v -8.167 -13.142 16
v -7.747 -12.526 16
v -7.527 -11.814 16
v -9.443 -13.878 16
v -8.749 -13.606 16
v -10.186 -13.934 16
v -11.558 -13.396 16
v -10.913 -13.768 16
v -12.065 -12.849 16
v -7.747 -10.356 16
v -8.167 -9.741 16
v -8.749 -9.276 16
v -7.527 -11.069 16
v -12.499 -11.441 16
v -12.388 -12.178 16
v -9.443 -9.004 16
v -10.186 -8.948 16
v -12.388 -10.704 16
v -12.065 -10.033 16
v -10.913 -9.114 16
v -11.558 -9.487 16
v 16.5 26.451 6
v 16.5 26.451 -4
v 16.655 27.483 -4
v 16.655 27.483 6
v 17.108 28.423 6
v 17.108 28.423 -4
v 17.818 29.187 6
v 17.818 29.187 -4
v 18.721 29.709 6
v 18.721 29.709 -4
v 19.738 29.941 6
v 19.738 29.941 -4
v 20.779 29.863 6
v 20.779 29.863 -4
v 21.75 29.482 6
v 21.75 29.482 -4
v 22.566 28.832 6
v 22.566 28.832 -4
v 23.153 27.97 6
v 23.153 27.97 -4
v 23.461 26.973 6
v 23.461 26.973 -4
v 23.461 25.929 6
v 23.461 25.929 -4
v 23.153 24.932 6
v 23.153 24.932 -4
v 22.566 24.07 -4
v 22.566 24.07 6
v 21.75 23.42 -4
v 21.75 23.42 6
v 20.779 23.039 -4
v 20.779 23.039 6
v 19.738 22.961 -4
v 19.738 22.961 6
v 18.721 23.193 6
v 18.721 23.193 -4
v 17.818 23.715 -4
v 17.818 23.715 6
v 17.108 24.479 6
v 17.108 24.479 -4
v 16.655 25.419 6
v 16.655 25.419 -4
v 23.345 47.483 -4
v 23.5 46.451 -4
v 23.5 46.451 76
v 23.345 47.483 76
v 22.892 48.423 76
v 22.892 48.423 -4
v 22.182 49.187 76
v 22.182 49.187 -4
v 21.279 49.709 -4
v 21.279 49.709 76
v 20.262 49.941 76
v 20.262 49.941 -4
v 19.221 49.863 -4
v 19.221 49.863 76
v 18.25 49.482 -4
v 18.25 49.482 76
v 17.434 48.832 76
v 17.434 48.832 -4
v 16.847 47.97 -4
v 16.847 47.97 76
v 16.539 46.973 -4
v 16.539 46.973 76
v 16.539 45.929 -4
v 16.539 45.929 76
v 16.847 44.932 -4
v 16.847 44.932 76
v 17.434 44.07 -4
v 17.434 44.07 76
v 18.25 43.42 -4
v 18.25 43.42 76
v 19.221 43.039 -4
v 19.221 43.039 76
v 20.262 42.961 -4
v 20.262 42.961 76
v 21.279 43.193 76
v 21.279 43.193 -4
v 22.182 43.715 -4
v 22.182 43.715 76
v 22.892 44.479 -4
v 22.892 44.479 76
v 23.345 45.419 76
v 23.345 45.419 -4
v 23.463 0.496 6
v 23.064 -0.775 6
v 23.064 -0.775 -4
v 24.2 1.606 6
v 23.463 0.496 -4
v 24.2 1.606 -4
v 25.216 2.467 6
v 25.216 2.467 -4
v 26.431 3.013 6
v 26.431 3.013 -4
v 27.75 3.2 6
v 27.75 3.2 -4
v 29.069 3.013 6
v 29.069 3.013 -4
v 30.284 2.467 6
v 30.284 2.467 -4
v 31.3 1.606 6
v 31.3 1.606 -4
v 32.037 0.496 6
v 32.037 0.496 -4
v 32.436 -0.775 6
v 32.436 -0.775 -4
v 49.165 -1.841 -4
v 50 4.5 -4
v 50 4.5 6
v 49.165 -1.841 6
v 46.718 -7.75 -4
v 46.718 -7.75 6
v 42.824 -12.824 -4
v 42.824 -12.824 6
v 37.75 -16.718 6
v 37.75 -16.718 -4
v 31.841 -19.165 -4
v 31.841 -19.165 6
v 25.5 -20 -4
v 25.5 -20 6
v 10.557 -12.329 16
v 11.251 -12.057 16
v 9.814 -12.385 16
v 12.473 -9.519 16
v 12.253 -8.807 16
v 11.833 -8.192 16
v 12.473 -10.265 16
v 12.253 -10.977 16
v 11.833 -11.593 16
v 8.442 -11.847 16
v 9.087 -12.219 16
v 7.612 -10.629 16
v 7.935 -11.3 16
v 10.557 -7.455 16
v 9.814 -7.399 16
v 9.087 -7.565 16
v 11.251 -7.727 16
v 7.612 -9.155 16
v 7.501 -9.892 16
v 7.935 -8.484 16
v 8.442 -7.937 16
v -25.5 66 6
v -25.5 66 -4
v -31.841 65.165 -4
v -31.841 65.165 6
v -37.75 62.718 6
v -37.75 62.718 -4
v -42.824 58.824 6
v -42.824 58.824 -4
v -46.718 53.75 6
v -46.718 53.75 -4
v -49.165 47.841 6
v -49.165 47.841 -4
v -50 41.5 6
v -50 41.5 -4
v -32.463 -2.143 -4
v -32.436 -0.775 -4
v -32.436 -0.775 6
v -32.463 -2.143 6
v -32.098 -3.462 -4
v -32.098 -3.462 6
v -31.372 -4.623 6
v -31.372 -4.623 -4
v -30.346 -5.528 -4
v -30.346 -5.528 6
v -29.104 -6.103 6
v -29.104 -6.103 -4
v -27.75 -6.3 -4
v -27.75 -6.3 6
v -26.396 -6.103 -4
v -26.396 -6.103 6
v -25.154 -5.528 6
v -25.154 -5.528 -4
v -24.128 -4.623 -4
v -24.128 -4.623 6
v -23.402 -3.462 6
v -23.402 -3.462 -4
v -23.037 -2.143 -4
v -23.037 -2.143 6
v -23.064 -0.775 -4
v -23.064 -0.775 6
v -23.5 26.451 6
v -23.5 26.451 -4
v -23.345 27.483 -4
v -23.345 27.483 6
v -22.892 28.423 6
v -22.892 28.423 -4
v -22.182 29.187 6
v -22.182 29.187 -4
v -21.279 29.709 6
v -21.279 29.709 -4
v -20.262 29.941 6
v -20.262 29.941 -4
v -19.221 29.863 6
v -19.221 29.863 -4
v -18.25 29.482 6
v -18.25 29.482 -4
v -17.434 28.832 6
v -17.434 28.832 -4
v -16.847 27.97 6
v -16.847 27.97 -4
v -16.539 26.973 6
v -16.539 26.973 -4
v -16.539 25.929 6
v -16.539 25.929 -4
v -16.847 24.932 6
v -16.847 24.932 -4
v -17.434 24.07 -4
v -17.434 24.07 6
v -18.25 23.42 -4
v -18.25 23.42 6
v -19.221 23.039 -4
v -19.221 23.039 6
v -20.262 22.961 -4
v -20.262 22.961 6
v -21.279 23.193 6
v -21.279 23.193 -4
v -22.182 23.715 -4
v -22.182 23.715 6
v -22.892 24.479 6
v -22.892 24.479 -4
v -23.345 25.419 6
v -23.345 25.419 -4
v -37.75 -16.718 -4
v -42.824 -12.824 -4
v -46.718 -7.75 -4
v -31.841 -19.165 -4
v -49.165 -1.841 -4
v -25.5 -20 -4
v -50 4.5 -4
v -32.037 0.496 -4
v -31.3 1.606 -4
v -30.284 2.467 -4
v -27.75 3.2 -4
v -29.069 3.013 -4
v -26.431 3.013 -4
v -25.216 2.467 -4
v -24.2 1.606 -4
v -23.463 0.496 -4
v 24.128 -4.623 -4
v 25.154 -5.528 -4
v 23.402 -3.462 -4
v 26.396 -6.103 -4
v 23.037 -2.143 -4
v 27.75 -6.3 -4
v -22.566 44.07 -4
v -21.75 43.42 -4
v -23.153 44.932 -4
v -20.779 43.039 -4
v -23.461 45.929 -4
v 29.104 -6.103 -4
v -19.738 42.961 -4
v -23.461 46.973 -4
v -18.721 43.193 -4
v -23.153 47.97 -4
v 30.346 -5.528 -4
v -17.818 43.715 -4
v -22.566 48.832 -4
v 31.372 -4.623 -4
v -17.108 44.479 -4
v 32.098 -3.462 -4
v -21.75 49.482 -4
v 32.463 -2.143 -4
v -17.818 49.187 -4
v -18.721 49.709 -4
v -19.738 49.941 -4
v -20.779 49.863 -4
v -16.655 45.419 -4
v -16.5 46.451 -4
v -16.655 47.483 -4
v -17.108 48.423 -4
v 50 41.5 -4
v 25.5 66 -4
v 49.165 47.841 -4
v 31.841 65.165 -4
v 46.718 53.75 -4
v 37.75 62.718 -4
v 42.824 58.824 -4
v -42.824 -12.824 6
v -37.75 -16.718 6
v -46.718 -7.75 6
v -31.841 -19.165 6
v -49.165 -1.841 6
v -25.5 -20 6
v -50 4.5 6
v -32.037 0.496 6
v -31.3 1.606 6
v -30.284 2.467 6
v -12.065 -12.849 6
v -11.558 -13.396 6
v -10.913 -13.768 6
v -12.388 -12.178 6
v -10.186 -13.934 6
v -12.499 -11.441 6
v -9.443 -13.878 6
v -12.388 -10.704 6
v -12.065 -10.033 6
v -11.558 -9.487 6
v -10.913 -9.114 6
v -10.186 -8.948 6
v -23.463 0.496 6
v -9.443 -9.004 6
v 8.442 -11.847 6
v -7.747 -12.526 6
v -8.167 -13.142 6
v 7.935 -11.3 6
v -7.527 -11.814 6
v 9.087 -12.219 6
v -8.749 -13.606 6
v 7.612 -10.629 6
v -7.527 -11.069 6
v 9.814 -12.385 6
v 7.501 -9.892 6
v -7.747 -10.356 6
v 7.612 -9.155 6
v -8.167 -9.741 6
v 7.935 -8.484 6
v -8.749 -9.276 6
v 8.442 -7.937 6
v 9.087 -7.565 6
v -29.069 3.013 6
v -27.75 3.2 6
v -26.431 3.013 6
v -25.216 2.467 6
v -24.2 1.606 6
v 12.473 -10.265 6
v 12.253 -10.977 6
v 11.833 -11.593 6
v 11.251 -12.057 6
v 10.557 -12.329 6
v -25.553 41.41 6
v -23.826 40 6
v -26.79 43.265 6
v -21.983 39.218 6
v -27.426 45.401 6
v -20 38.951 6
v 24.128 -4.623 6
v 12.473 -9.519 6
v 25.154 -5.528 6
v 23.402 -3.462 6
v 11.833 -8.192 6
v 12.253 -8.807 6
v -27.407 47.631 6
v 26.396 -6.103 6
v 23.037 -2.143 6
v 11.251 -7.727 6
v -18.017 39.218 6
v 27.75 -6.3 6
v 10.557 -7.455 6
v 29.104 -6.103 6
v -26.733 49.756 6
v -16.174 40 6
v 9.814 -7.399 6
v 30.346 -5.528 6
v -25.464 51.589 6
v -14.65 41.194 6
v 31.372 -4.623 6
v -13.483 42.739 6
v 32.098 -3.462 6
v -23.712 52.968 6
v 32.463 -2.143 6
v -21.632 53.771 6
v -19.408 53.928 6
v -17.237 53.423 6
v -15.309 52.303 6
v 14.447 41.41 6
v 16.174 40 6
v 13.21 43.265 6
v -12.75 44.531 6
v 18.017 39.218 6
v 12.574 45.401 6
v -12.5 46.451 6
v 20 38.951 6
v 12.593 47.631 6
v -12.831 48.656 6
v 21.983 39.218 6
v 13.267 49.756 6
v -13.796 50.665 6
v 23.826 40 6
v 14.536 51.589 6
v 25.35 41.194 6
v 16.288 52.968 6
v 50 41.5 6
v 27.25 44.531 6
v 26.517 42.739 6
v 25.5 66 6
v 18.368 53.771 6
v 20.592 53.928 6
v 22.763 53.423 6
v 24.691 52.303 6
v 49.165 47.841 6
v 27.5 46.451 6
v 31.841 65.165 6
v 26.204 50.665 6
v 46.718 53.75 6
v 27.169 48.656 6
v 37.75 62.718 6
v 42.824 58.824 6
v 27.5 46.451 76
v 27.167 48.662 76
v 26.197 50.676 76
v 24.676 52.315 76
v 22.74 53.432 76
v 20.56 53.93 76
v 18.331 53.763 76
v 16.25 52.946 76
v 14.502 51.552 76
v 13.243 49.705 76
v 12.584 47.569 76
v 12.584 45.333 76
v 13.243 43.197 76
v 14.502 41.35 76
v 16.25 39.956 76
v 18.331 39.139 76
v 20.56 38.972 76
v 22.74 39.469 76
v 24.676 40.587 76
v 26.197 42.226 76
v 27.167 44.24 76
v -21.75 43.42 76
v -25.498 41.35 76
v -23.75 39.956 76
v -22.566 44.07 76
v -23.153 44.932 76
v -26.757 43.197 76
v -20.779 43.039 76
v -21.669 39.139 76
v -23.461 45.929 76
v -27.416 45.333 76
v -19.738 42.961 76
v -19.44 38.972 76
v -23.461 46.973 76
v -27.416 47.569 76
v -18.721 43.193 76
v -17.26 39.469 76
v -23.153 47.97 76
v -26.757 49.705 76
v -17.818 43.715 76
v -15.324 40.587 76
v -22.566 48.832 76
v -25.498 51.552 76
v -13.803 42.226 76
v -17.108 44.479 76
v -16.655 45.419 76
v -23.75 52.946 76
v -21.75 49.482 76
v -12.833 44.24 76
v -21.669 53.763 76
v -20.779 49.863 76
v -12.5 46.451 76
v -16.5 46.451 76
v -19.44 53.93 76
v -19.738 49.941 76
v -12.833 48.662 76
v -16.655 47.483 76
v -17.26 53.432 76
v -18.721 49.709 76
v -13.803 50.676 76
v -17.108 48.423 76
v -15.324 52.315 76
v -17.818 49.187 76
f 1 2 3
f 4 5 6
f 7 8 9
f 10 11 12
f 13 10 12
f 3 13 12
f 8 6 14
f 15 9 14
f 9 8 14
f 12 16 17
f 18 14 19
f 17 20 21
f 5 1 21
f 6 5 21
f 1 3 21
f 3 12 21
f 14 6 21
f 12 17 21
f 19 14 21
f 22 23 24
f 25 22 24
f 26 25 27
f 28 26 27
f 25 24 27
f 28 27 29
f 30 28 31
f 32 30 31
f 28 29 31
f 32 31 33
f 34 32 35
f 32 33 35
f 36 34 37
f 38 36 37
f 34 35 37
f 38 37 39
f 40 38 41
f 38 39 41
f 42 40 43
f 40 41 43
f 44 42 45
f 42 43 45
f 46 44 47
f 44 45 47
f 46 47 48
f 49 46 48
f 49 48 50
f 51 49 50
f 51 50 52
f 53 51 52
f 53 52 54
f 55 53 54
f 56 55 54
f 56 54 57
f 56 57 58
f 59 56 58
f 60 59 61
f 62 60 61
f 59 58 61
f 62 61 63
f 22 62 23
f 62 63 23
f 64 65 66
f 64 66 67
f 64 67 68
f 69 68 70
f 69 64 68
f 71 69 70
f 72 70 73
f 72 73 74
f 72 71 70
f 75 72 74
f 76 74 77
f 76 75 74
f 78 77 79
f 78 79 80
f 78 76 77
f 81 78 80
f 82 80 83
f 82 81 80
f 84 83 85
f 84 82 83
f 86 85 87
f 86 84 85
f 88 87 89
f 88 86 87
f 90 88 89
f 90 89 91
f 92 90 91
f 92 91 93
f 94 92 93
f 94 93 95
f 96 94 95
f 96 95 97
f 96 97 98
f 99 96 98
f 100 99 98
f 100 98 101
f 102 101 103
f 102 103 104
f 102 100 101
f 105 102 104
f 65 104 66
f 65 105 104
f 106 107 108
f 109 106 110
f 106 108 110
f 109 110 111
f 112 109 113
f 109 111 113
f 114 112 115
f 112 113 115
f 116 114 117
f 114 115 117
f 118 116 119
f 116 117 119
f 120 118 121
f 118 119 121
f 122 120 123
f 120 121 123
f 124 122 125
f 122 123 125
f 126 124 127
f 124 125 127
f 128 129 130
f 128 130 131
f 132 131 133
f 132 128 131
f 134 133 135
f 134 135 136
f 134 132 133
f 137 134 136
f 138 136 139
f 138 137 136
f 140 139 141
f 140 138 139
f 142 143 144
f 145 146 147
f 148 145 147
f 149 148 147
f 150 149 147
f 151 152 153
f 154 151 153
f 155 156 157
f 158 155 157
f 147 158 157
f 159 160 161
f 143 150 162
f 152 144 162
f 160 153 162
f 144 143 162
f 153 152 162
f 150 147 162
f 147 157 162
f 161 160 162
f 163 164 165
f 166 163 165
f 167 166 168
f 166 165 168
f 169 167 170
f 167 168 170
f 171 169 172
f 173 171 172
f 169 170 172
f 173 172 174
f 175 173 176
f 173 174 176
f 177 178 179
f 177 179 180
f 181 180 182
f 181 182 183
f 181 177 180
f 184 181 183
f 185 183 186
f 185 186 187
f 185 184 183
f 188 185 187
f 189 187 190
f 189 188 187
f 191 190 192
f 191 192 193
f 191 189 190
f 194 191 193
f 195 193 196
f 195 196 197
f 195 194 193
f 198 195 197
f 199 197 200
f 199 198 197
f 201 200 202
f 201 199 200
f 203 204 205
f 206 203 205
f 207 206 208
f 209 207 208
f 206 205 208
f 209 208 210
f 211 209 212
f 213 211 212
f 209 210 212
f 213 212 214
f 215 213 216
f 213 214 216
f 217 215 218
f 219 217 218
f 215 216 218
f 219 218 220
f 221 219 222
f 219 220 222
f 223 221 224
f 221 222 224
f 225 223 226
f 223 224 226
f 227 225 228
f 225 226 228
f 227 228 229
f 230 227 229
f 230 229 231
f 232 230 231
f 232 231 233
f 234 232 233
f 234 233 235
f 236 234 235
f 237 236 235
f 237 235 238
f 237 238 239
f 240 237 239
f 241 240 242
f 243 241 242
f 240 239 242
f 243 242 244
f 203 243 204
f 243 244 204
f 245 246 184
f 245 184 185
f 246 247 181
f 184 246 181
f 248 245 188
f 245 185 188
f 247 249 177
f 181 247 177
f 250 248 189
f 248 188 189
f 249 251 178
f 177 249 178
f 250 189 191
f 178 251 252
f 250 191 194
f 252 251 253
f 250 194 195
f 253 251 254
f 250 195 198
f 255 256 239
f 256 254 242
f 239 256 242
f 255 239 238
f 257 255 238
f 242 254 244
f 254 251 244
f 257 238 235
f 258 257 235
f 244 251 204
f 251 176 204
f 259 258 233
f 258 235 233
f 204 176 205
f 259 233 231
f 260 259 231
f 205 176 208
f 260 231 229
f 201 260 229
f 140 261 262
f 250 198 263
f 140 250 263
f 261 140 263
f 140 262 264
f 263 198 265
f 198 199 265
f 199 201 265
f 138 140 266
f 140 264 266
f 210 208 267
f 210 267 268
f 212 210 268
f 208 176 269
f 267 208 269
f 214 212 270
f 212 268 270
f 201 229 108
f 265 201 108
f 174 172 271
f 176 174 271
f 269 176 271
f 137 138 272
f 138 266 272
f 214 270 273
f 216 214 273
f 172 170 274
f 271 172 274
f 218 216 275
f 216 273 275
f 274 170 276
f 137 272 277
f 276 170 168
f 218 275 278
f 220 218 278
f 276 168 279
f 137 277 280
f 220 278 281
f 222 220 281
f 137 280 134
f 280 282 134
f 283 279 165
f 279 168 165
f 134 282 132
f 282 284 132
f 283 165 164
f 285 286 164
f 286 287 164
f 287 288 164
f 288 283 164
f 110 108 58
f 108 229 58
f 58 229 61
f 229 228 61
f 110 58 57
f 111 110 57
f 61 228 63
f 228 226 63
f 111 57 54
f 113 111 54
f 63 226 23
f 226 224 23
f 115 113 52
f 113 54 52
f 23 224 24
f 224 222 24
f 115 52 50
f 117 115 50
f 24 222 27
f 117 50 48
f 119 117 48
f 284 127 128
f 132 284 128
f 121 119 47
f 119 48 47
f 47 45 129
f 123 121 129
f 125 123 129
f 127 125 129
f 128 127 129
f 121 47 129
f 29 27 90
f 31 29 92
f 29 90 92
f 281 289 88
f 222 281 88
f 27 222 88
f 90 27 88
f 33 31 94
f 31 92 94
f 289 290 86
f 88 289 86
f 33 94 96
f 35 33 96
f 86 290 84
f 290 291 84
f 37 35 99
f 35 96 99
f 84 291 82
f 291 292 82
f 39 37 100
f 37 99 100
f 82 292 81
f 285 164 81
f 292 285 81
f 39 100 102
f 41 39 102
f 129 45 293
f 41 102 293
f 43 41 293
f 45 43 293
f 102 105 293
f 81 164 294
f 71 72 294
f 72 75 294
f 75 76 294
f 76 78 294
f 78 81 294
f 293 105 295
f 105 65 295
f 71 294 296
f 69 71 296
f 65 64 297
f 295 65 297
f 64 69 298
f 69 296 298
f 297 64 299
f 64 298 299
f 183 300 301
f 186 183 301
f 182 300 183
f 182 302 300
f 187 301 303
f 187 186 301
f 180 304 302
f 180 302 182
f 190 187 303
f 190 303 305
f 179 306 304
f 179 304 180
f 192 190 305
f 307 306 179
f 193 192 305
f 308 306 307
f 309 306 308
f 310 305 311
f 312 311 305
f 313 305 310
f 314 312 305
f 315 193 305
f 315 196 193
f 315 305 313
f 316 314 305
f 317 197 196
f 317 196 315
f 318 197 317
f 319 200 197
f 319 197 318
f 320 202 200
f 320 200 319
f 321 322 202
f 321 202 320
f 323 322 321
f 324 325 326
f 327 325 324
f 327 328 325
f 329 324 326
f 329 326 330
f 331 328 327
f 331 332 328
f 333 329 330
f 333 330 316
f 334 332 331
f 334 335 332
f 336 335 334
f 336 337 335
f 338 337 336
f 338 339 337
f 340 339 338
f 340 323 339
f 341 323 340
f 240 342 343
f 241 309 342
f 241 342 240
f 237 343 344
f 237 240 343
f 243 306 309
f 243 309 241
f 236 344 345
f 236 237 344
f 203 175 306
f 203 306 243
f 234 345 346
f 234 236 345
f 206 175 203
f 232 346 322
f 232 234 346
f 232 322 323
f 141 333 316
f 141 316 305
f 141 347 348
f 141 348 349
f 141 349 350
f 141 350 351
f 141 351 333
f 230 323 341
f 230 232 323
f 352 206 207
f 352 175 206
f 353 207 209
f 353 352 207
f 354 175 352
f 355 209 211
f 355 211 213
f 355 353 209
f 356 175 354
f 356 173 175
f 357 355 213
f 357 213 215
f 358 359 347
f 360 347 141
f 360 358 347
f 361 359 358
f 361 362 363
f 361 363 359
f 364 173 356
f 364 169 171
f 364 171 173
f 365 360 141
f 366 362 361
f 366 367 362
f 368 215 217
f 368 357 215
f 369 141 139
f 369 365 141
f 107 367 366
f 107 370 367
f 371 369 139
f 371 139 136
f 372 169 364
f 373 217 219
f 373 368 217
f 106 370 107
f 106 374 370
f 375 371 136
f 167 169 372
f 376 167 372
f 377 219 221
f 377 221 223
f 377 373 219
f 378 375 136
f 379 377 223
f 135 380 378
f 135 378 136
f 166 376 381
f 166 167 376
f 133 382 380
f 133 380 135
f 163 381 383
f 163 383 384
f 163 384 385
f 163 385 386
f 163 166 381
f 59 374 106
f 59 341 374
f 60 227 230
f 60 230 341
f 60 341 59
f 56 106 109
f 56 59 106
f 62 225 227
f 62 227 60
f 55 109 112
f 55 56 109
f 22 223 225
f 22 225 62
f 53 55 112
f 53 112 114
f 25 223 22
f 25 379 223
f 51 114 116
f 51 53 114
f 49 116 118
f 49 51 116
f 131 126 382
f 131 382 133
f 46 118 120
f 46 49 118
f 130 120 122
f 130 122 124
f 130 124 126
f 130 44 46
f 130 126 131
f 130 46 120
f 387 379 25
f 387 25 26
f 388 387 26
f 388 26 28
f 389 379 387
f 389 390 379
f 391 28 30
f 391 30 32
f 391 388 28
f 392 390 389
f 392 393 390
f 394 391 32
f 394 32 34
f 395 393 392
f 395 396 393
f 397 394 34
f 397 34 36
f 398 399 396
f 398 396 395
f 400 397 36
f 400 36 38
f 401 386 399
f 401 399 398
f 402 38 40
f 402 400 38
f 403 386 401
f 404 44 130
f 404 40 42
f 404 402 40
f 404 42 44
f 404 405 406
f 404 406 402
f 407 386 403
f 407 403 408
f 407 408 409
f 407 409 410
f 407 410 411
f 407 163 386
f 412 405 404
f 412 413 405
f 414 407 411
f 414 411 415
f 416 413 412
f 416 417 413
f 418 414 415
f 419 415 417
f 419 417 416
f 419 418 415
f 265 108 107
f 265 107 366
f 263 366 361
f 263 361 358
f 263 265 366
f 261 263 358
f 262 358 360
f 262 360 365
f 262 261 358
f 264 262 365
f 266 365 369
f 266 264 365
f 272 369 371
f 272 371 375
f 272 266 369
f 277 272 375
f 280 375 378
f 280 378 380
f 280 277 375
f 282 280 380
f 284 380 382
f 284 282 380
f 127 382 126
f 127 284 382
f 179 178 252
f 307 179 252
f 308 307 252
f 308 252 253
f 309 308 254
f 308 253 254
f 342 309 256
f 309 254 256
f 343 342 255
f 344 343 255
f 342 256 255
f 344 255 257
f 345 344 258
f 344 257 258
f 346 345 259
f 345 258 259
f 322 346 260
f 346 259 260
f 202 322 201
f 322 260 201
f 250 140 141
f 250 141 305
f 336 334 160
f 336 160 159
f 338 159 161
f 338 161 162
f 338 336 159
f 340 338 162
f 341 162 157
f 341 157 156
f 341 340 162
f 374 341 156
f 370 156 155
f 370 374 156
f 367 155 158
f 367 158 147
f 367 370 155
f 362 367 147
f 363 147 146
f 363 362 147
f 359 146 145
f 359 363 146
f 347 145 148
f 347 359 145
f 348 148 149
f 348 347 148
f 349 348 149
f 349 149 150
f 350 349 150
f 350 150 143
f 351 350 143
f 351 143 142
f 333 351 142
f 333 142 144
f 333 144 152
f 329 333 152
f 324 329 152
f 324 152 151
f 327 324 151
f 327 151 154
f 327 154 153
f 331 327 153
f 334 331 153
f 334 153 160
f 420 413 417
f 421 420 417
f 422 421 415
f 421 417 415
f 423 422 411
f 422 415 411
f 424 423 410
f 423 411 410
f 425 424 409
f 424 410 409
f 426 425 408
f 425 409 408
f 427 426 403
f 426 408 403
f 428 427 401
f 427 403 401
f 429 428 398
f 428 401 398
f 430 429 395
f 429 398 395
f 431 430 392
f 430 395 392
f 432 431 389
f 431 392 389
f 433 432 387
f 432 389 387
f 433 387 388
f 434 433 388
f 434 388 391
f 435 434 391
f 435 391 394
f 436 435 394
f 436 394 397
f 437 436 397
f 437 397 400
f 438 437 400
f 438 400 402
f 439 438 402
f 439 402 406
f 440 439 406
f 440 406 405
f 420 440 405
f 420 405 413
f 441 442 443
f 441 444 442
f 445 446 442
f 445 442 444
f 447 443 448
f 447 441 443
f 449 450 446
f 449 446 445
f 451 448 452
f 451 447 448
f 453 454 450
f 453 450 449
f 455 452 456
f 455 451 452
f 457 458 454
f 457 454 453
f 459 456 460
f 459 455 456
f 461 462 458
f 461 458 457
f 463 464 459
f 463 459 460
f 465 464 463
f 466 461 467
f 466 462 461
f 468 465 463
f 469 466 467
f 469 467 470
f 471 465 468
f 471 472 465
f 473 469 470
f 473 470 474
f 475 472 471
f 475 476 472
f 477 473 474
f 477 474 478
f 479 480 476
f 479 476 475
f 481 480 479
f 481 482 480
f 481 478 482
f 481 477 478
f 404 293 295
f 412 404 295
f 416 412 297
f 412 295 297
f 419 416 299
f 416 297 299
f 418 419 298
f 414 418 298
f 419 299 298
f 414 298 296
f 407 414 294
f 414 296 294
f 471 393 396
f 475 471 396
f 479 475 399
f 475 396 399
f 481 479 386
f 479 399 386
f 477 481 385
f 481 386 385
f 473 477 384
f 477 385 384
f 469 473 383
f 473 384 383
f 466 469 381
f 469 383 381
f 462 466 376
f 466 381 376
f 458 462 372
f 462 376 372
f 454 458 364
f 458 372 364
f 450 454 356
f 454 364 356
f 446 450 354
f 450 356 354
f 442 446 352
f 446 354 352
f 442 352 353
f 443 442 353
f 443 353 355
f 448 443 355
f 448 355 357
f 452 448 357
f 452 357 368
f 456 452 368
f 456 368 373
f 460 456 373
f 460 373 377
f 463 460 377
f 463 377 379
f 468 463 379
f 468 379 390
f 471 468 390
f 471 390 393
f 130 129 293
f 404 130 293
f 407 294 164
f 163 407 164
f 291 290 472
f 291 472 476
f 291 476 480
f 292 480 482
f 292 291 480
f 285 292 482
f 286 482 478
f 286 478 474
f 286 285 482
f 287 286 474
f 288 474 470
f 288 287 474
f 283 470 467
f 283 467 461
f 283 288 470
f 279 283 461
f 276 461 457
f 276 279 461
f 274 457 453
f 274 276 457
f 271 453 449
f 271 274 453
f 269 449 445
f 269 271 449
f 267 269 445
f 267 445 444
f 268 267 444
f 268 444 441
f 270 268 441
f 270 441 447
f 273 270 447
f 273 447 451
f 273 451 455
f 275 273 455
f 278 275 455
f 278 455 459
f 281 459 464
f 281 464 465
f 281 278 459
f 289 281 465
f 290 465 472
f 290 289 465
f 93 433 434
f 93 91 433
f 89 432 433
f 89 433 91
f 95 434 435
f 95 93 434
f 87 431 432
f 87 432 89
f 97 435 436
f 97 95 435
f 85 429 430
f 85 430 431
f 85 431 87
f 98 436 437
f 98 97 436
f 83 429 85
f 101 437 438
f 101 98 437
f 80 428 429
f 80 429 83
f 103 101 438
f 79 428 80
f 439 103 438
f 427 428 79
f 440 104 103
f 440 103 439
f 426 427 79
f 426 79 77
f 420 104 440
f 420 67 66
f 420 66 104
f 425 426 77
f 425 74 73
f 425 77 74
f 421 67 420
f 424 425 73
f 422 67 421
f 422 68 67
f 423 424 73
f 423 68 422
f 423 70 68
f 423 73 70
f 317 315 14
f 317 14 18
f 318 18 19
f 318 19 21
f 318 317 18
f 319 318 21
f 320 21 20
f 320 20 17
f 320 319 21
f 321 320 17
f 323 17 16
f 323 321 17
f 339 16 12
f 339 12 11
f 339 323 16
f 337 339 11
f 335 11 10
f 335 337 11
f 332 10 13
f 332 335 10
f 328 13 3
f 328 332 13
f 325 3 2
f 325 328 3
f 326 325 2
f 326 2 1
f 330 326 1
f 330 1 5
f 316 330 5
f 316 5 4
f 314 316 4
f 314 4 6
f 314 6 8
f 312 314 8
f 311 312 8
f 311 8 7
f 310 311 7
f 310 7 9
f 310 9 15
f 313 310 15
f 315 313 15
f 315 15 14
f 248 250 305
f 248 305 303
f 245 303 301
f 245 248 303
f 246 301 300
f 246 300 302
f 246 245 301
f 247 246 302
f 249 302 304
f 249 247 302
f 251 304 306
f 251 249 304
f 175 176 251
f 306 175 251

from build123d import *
from build123d.topology import SkipClean

# Parameters (mm, degrees)
BOSS_EXTRUDE1_DEPTH      = 6
BOSS_EXTRUDE1_DEPTH_BACK = 4
SKETCH1_W                = 100
SKETCH1_H                = 50
SKETCH2_R                = 4.75
CUT_EXTRUDE1_DEPTH       = 57.789083458
MOVE_FACE2_BY            = 15
SKETCH3_W                = 100
SKETCH3_H                = 12
BOSS_EXTRUDE2_DEPTH      = 70
SKETCH4_R                = 2.5
BOSS_EXTRUDE3_DEPTH      = 20
SKETCH5_W                = 100
SKETCH5_H                = 56.133601368
BOSS_EXTRUDE4_DEPTH      = 10
CUT_EXTRUDE2_START       = -10
SKETCH6_R                = 4.75
SKETCH6_R_2              = 2.5
CUT_EXTRUDE2_DEPTH       = 10
FILLET2_R                = 24.5
FILLET3_R                = 5
CUT_EXTRUDE3_START       = -10
CUT_EXTRUDE3_DEPTH       = 10
BOSS_EXTRUDE5_START      = -10
SKETCH8_R                = 2.5
BOSS_EXTRUDE5_DEPTH      = 10
MOVE_START               = -4
MOVE_FACE3_DEPTH         = 10
SKETCH11_R               = 7.5
BOSS_EXTRUDE6_DEPTH      = 70
CUT_EXTRUDE4_START       = -70
CUT_EXTRUDE4_DEPTH       = 70
SKETCH13_R               = 3.5
CUT_EXTRUDE5_DEPTH       = 103.46950766
MOVE_START_2             = 6
MOVE_FACE4_OUTLINE_R     = 7.5
MOVE_FACE4_OUTLINE_R_2   = 3.5
MOVE_FACE4_DEPTH         = 70
MOVE_FACE4_2_OUTLINE_R   = 7.5
MOVE_FACE4_2_OUTLINE_R_2 = 3.5
MOVE_FACE4_2_DEPTH       = 80
MOVE_FACE4_3_OUTLINE_R   = 3.5
MOVE_FACE4_3_DEPTH       = 10
MOVE_FACE5_DEPTH         = 10
MOVE_FACE5_2_DEPTH       = 10
MOVE_FACE6_DEPTH         = 10
SKETCH17_R               = 3.5
CUT_EXTRUDE9_DEPTH       = 10


# Read off the part's stored shape, not the designer's step: Move Face3, Move Face4, Move Face5, Move Face6
with BuildPart() as part:
    # Sketch1 → Boss-Extrude1 (new, two sides: drawn at the far end of the back side and taken through both)
    with BuildSketch(Plane.XY.offset(-BOSS_EXTRUDE1_DEPTH_BACK)):
        Rectangle(SKETCH1_W, SKETCH1_H)
    extrude(amount=BOSS_EXTRUDE1_DEPTH + BOSS_EXTRUDE1_DEPTH_BACK)

    # Sketch2 → Cut-Extrude1 (cut, through all)
    with BuildSketch(Plane.XY.offset(6)):
        with Locations((27.75, 0)):
            Circle(SKETCH2_R)
        with Locations((-27.75, 0)):
            Circle(SKETCH2_R)
    extrude(amount=-CUT_EXTRUDE1_DEPTH, mode=Mode.SUBTRACT)

    # Move Face2: a face moved outward by 15.0
    extrude(part.faces().sort_by_distance((0, 25, 1))[0], amount=MOVE_FACE2_BY, dir=(0, 1, 0))

    # Sketch3 → Boss-Extrude2 (add)
    with BuildSketch(Plane.XY.offset(6)):
        with Locations((0, 34)):
            Rectangle(SKETCH3_W, SKETCH3_H)
    extrude(amount=BOSS_EXTRUDE2_DEPTH)

    # Sketch4 → Boss-Extrude3 (add)
    with BuildSketch(Plane(origin=(0, 0, -4), x_dir=(-1, 0, 0), z_dir=(0, 0, -1))):
        with Locations((9.999238357, -11.441146597)):
            Circle(SKETCH4_R)
        with Locations((-10.000761643, -9.892069005)):
            Circle(SKETCH4_R)
    extrude(amount=-BOSS_EXTRUDE3_DEPTH)

    # Sketch5 → Boss-Extrude4 (add)
    with BuildSketch(Plane.XY.offset(76)):
        with Locations((0, 11.933199316)):
            Rectangle(SKETCH5_W, SKETCH5_H)
    extrude(amount=BOSS_EXTRUDE4_DEPTH)

    # Sketch6 → Cut-Extrude2 (cut)
    with BuildSketch(Plane(origin=(0, 0, -4), x_dir=(-1, 0, 0), z_dir=(0, 0, -1)).offset(CUT_EXTRUDE2_START)):
        with Locations(Location((27.75, 0, 0), (0, 0, 180))):
            Circle(SKETCH6_R)
        with Locations((10.004296788, -9.901140623)):
            Circle(SKETCH6_R_2)
        with Locations((-9.995700599, -9.91136318)):
            Circle(SKETCH6_R_2)
        with Locations(Location((-27.75, 0, 0), (0, 0, 180))):
            Circle(SKETCH6_R)
    extrude(amount=CUT_EXTRUDE2_DEPTH, mode=Mode.SUBTRACT)

    # Fillet2
    # the kernel refuses this fillet: 24.5 mm, written as the material it takes off along each edge
    with BuildSketch(Plane(origin=(50, -16.133601368, 14.75), x_dir=(0, 1, 0), z_dir=(0, 0, 1)), Plane(origin=(50, -25, -65.25), x_dir=(0, 1, 0), z_dir=(0, 0, 1))) as fillet2_piece_1:
        with BuildLine():
            CenterArc((FILLET2_R, FILLET2_R), FILLET2_R, 180, 90)
            Line((0, FILLET2_R), (0, 0))
            Line((0, 0), (FILLET2_R, 0))
        make_face()
    extrude(amount=132.5, mode=Mode.SUBTRACT)
    with BuildSketch(Plane(origin=(-50, 40, 147.25), x_dir=(0, -1, 0), z_dir=(0, 0, -1)), Plane(origin=(50, 40, -65.25), x_dir=(0, -1, 0), z_dir=(0, 0, 1))) as fillet2_piece_2:
        with BuildLine():
            CenterArc((FILLET2_R, -FILLET2_R), FILLET2_R, 90, 90)
            Line((0, -FILLET2_R), (0, 0))
            Line((0, 0), (FILLET2_R, 0))
        make_face()
    extrude(amount=212.5, mode=Mode.SUBTRACT)
    with BuildSketch(Plane(origin=(-50, -16.133601368, 14.75), x_dir=(0, 1, 0), z_dir=(0, 0, 1)), Plane(origin=(-50, -25, 67.25), x_dir=(1, 0, 0), z_dir=(0, 0, -1))) as fillet2_piece_3:
        with BuildLine():
            CenterArc((FILLET2_R, -FILLET2_R), FILLET2_R, 90, 90)
            Line((0, -FILLET2_R), (0, 0))
            Line((0, 0), (FILLET2_R, 0))
        make_face()
    extrude(amount=132.5, mode=Mode.SUBTRACT)

    # Fillet3
    fillet3_edges = [part.edges().sort_by_distance(p)[0] for p in [
        (46.571307506, 28, 41),
        (-46.571307506, 28, 41),
    ]]
    fillet(fillet3_edges, radius=FILLET3_R)

    # Sketch7 → Cut-Extrude3 (cut)
    with BuildSketch(Plane.XY.offset(86).offset(CUT_EXTRUDE3_START)):
        with BuildLine():
            Line((-25.5, -16.133601368), (25.5, -16.133601368))
            ThreePointArc((25.5, -16.133601368), (42.824116139, -8.957717507), (50, 8.366398632))
            Line((50, 8.366398632), (50, 15.5))
            ThreePointArc((50, 15.5), (42.824116139, 32.824116139), (25.5, 40))
            Line((25.5, 40), (-25.5, 40))
            ThreePointArc((-25.5, 40), (-42.824116139, 32.824116139), (-50, 15.5))
            Line((-50, 15.5), (-50, 8.366398632))
            ThreePointArc((-50, 8.366398632), (-42.824116139, -8.957717507), (-25.5, -16.133601368))
        make_face()
    extrude(amount=CUT_EXTRUDE3_DEPTH, mode=Mode.SUBTRACT)

    # Sketch8 → Boss-Extrude5 (add)
    with BuildSketch(Plane(origin=(0, 0, -4), x_dir=(-1, 0, 0), z_dir=(0, 0, -1)).offset(BOSS_EXTRUDE5_START)):
        with Locations((10.004296788, -9.901140623)):
            Circle(SKETCH8_R)
        with Locations((-9.995700599, -9.91136318)):
            Circle(SKETCH8_R)
    extrude(amount=BOSS_EXTRUDE5_DEPTH)

    # Move Face3 outline → Move Face3 (cut)
    with BuildSketch(Plane.XY.offset(MOVE_START)):
        with BuildLine():
            Line((25.5, -20), (-25.5, -20))
            ThreePointArc((-25.5, -20), (-42.824116139, -12.824116139), (-50, 4.5))
            Line((-50, 4.5), (-50, -0.5))
            ThreePointArc((-50, -0.5), (-42.824116139, -17.824116139), (-25.5, -25))
            Line((-25.5, -25), (25.5, -25))
            ThreePointArc((25.5, -25), (42.824116139, -17.824116139), (50, -0.5))
            Line((50, -0.5), (50, 4.5))
            ThreePointArc((50, 4.5), (42.824116139, -12.824116139), (25.5, -20))
        make_face()
    extrude(amount=MOVE_FACE3_DEPTH, mode=Mode.SUBTRACT)

    # Sketch11 → Boss-Extrude6 (add)
    with BuildSketch(Plane.XY.offset(6)):
        with Locations((-20, 28.450922409)):
            Circle(SKETCH11_R)
        with Locations((20, 28.450922409)):
            Circle(SKETCH11_R)
    extrude(amount=BOSS_EXTRUDE6_DEPTH)

    # Sketch12 → Cut-Extrude4 (cut)
    with SkipClean():  # the faces are left unmerged after this step: merging them gives an invalid solid
        with BuildSketch(Plane.XY.offset(76).offset(CUT_EXTRUDE4_START)):
            with BuildLine():
                Line((-34.102325267, 28), (-27.486432327, 28))
                ThreePointArc((-27.486432327, 28), (-20, 35.950922409), (-12.513567673, 28))
                Line((-12.513567673, 28), (12.513567673, 28))
                ThreePointArc((12.513567673, 28), (20, 35.950922409), (27.486432327, 28))
                Line((27.486432327, 28), (34.102325267, 28))
                ThreePointArc((34.102325267, 28), (38.972432937, 31.867722966), (36.308049694, 37.487179487))
                ThreePointArc((36.308049694, 37.487179487), (31.048157467, 39.363527583), (25.5, 40))
                Line((25.5, 40), (-25.5, 40))
                ThreePointArc((-25.5, 40), (-31.048157467, 39.363527583), (-36.308049694, 37.487179487))
                ThreePointArc((-36.308049694, 37.487179487), (-38.972432937, 31.867722966), (-34.102325267, 28))
            make_face()
        extrude(amount=CUT_EXTRUDE4_DEPTH, mode=Mode.SUBTRACT)

    # Sketch13 → Cut-Extrude5 (cut, through all)
    with SkipClean():  # the faces are left unmerged after this step: merging them gives an invalid solid
        with BuildSketch(Plane.XY.offset(76)):
            with Locations((-20, 28.450922409)):
                Circle(SKETCH13_R)
            with Locations((20, 28.450922409)):
                Circle(SKETCH13_R)
        extrude(amount=-CUT_EXTRUDE5_DEPTH, mode=Mode.SUBTRACT)

    # Move Face4 outline → Move Face4 (cut)
    # profile 1 of 2: a face of its own
    with BuildSketch(Plane.XY.offset(MOVE_START_2)):
        with Locations((20, 28.450922409)):
            Circle(MOVE_FACE4_OUTLINE_R)
        with Locations((20, 28.450922409)):
            Circle(MOVE_FACE4_OUTLINE_R_2, mode=Mode.SUBTRACT)
    # profile 2 of 2: a face of its own
    with BuildSketch(Plane.XY.offset(MOVE_START_2)):
        with Locations((-20, 28.450922409)):
            Circle(MOVE_FACE4_OUTLINE_R)
        with Locations((-20, 28.450922409)):
            Circle(MOVE_FACE4_OUTLINE_R_2, mode=Mode.SUBTRACT)
    extrude(amount=MOVE_FACE4_DEPTH, mode=Mode.SUBTRACT)

    # Move Face4 2 outline → Move Face4 2 (add)
    # profile 1 of 2: a face of its own
    with BuildSketch(Plane.XY.offset(MOVE_START)):
        with Locations((20, 46.450922409)):
            Circle(MOVE_FACE4_2_OUTLINE_R)
        with Locations((20, 46.450922409)):
            Circle(MOVE_FACE4_2_OUTLINE_R_2, mode=Mode.SUBTRACT)
    # profile 2 of 2: a face of its own
    with BuildSketch(Plane.XY.offset(MOVE_START)):
        with Locations((-20, 46.450922409)):
            Circle(MOVE_FACE4_2_OUTLINE_R)
        with Locations((-20, 46.450922409)):
            Circle(MOVE_FACE4_2_OUTLINE_R_2, mode=Mode.SUBTRACT)
    extrude(amount=MOVE_FACE4_2_DEPTH)

    # Move Face4 3 outline → Move Face4 3 (add)
    with BuildSketch(Plane.XY.offset(MOVE_START)):
        with BuildLine():
            ThreePointArc((50, 33.5), (42.824116139, 50.824116139), (25.5, 58))
            Line((25.5, 58), (-25.5, 58))
            ThreePointArc((-25.5, 58), (-42.824116139, 50.824116139), (-50, 33.5))
            Line((-50, 33.5), (-50, 15.5))
            ThreePointArc((-50, 15.5), (-42.824116139, 32.824116139), (-25.5, 40))
            Line((-25.5, 40), (-23.825650281, 40))
            ThreePointArc((-23.825650281, 40), (-20, 53.950922409), (-16.174349719, 40))
            Line((-16.174349719, 40), (16.174349719, 40))
            ThreePointArc((16.174349719, 40), (20, 53.950922409), (23.825650281, 40))
            Line((23.825650281, 40), (25.5, 40))
            ThreePointArc((25.5, 40), (42.824116139, 32.824116139), (50, 15.5))
            Line((50, 15.5), (50, 33.5))
        make_face()
        with Locations((20, 28.450922409)):
            Circle(MOVE_FACE4_3_OUTLINE_R)
        with Locations((-20, 28.450922409)):
            Circle(MOVE_FACE4_3_OUTLINE_R)
    extrude(amount=MOVE_FACE4_3_DEPTH)

    # Move Face5 outline → Move Face5 (cut)
    with BuildSketch(Plane.XY.offset(MOVE_START)):
        with BuildLine():
            ThreePointArc((-32.436349859, -0.775), (-27.75, -6.3), (-23.063650141, -0.775))
            ThreePointArc((-23.063650141, -0.775), (-27.75, -4.75), (-32.436349859, -0.775))
        make_face()
        with BuildLine():
            ThreePointArc((23.063650141, -0.775), (27.75, -6.3), (32.436349859, -0.775))
            ThreePointArc((32.436349859, -0.775), (27.75, -4.75), (23.063650141, -0.775))
        make_face()
    extrude(amount=MOVE_FACE5_DEPTH, mode=Mode.SUBTRACT)

    # Move Face5 2 outline → Move Face5 2 (add)
    with BuildSketch(Plane.XY.offset(MOVE_START)):
        with BuildLine():
            ThreePointArc((-32.436349859, -0.775), (-27.75, 3.2), (-23.063650141, -0.775))
            ThreePointArc((-23.063650141, -0.775), (-27.75, 4.75), (-32.436349859, -0.775))
        make_face()
        with BuildLine():
            ThreePointArc((23.063650141, -0.775), (27.75, 3.2), (32.436349859, -0.775))
            ThreePointArc((32.436349859, -0.775), (27.75, 4.75), (23.063650141, -0.775))
        make_face()
    extrude(amount=MOVE_FACE5_2_DEPTH)

    # Move Face6 outline → Move Face6 (add)
    with BuildSketch(Plane.XY.offset(MOVE_START)):
        with BuildLine():
            ThreePointArc((50, 41.5), (42.824116139, 58.824116139), (25.5, 66))
            Line((25.5, 66), (-25.5, 66))
            ThreePointArc((-25.5, 66), (-42.824116139, 58.824116139), (-50, 41.5))
            Line((-50, 41.5), (-50, 33.5))
            ThreePointArc((-50, 33.5), (-42.824116139, 50.824116139), (-25.5, 58))
            Line((-25.5, 58), (25.5, 58))
            ThreePointArc((25.5, 58), (42.824116139, 50.824116139), (50, 33.5))
            Line((50, 33.5), (50, 41.5))
        make_face()
    extrude(amount=MOVE_FACE6_DEPTH)

    # Sketch17 → Cut-Extrude9 (cut)
    with BuildSketch(Plane(origin=(0, 0, -4), x_dir=(-1, 0, 0), z_dir=(0, 0, -1))):
        with Locations((-20, 26.450922409)):
            Circle(SKETCH17_R)
        with Locations((20, 26.450922409)):
            Circle(SKETCH17_R)
    extrude(amount=-CUT_EXTRUDE9_DEPTH, mode=Mode.SUBTRACT)


solid = part.part
